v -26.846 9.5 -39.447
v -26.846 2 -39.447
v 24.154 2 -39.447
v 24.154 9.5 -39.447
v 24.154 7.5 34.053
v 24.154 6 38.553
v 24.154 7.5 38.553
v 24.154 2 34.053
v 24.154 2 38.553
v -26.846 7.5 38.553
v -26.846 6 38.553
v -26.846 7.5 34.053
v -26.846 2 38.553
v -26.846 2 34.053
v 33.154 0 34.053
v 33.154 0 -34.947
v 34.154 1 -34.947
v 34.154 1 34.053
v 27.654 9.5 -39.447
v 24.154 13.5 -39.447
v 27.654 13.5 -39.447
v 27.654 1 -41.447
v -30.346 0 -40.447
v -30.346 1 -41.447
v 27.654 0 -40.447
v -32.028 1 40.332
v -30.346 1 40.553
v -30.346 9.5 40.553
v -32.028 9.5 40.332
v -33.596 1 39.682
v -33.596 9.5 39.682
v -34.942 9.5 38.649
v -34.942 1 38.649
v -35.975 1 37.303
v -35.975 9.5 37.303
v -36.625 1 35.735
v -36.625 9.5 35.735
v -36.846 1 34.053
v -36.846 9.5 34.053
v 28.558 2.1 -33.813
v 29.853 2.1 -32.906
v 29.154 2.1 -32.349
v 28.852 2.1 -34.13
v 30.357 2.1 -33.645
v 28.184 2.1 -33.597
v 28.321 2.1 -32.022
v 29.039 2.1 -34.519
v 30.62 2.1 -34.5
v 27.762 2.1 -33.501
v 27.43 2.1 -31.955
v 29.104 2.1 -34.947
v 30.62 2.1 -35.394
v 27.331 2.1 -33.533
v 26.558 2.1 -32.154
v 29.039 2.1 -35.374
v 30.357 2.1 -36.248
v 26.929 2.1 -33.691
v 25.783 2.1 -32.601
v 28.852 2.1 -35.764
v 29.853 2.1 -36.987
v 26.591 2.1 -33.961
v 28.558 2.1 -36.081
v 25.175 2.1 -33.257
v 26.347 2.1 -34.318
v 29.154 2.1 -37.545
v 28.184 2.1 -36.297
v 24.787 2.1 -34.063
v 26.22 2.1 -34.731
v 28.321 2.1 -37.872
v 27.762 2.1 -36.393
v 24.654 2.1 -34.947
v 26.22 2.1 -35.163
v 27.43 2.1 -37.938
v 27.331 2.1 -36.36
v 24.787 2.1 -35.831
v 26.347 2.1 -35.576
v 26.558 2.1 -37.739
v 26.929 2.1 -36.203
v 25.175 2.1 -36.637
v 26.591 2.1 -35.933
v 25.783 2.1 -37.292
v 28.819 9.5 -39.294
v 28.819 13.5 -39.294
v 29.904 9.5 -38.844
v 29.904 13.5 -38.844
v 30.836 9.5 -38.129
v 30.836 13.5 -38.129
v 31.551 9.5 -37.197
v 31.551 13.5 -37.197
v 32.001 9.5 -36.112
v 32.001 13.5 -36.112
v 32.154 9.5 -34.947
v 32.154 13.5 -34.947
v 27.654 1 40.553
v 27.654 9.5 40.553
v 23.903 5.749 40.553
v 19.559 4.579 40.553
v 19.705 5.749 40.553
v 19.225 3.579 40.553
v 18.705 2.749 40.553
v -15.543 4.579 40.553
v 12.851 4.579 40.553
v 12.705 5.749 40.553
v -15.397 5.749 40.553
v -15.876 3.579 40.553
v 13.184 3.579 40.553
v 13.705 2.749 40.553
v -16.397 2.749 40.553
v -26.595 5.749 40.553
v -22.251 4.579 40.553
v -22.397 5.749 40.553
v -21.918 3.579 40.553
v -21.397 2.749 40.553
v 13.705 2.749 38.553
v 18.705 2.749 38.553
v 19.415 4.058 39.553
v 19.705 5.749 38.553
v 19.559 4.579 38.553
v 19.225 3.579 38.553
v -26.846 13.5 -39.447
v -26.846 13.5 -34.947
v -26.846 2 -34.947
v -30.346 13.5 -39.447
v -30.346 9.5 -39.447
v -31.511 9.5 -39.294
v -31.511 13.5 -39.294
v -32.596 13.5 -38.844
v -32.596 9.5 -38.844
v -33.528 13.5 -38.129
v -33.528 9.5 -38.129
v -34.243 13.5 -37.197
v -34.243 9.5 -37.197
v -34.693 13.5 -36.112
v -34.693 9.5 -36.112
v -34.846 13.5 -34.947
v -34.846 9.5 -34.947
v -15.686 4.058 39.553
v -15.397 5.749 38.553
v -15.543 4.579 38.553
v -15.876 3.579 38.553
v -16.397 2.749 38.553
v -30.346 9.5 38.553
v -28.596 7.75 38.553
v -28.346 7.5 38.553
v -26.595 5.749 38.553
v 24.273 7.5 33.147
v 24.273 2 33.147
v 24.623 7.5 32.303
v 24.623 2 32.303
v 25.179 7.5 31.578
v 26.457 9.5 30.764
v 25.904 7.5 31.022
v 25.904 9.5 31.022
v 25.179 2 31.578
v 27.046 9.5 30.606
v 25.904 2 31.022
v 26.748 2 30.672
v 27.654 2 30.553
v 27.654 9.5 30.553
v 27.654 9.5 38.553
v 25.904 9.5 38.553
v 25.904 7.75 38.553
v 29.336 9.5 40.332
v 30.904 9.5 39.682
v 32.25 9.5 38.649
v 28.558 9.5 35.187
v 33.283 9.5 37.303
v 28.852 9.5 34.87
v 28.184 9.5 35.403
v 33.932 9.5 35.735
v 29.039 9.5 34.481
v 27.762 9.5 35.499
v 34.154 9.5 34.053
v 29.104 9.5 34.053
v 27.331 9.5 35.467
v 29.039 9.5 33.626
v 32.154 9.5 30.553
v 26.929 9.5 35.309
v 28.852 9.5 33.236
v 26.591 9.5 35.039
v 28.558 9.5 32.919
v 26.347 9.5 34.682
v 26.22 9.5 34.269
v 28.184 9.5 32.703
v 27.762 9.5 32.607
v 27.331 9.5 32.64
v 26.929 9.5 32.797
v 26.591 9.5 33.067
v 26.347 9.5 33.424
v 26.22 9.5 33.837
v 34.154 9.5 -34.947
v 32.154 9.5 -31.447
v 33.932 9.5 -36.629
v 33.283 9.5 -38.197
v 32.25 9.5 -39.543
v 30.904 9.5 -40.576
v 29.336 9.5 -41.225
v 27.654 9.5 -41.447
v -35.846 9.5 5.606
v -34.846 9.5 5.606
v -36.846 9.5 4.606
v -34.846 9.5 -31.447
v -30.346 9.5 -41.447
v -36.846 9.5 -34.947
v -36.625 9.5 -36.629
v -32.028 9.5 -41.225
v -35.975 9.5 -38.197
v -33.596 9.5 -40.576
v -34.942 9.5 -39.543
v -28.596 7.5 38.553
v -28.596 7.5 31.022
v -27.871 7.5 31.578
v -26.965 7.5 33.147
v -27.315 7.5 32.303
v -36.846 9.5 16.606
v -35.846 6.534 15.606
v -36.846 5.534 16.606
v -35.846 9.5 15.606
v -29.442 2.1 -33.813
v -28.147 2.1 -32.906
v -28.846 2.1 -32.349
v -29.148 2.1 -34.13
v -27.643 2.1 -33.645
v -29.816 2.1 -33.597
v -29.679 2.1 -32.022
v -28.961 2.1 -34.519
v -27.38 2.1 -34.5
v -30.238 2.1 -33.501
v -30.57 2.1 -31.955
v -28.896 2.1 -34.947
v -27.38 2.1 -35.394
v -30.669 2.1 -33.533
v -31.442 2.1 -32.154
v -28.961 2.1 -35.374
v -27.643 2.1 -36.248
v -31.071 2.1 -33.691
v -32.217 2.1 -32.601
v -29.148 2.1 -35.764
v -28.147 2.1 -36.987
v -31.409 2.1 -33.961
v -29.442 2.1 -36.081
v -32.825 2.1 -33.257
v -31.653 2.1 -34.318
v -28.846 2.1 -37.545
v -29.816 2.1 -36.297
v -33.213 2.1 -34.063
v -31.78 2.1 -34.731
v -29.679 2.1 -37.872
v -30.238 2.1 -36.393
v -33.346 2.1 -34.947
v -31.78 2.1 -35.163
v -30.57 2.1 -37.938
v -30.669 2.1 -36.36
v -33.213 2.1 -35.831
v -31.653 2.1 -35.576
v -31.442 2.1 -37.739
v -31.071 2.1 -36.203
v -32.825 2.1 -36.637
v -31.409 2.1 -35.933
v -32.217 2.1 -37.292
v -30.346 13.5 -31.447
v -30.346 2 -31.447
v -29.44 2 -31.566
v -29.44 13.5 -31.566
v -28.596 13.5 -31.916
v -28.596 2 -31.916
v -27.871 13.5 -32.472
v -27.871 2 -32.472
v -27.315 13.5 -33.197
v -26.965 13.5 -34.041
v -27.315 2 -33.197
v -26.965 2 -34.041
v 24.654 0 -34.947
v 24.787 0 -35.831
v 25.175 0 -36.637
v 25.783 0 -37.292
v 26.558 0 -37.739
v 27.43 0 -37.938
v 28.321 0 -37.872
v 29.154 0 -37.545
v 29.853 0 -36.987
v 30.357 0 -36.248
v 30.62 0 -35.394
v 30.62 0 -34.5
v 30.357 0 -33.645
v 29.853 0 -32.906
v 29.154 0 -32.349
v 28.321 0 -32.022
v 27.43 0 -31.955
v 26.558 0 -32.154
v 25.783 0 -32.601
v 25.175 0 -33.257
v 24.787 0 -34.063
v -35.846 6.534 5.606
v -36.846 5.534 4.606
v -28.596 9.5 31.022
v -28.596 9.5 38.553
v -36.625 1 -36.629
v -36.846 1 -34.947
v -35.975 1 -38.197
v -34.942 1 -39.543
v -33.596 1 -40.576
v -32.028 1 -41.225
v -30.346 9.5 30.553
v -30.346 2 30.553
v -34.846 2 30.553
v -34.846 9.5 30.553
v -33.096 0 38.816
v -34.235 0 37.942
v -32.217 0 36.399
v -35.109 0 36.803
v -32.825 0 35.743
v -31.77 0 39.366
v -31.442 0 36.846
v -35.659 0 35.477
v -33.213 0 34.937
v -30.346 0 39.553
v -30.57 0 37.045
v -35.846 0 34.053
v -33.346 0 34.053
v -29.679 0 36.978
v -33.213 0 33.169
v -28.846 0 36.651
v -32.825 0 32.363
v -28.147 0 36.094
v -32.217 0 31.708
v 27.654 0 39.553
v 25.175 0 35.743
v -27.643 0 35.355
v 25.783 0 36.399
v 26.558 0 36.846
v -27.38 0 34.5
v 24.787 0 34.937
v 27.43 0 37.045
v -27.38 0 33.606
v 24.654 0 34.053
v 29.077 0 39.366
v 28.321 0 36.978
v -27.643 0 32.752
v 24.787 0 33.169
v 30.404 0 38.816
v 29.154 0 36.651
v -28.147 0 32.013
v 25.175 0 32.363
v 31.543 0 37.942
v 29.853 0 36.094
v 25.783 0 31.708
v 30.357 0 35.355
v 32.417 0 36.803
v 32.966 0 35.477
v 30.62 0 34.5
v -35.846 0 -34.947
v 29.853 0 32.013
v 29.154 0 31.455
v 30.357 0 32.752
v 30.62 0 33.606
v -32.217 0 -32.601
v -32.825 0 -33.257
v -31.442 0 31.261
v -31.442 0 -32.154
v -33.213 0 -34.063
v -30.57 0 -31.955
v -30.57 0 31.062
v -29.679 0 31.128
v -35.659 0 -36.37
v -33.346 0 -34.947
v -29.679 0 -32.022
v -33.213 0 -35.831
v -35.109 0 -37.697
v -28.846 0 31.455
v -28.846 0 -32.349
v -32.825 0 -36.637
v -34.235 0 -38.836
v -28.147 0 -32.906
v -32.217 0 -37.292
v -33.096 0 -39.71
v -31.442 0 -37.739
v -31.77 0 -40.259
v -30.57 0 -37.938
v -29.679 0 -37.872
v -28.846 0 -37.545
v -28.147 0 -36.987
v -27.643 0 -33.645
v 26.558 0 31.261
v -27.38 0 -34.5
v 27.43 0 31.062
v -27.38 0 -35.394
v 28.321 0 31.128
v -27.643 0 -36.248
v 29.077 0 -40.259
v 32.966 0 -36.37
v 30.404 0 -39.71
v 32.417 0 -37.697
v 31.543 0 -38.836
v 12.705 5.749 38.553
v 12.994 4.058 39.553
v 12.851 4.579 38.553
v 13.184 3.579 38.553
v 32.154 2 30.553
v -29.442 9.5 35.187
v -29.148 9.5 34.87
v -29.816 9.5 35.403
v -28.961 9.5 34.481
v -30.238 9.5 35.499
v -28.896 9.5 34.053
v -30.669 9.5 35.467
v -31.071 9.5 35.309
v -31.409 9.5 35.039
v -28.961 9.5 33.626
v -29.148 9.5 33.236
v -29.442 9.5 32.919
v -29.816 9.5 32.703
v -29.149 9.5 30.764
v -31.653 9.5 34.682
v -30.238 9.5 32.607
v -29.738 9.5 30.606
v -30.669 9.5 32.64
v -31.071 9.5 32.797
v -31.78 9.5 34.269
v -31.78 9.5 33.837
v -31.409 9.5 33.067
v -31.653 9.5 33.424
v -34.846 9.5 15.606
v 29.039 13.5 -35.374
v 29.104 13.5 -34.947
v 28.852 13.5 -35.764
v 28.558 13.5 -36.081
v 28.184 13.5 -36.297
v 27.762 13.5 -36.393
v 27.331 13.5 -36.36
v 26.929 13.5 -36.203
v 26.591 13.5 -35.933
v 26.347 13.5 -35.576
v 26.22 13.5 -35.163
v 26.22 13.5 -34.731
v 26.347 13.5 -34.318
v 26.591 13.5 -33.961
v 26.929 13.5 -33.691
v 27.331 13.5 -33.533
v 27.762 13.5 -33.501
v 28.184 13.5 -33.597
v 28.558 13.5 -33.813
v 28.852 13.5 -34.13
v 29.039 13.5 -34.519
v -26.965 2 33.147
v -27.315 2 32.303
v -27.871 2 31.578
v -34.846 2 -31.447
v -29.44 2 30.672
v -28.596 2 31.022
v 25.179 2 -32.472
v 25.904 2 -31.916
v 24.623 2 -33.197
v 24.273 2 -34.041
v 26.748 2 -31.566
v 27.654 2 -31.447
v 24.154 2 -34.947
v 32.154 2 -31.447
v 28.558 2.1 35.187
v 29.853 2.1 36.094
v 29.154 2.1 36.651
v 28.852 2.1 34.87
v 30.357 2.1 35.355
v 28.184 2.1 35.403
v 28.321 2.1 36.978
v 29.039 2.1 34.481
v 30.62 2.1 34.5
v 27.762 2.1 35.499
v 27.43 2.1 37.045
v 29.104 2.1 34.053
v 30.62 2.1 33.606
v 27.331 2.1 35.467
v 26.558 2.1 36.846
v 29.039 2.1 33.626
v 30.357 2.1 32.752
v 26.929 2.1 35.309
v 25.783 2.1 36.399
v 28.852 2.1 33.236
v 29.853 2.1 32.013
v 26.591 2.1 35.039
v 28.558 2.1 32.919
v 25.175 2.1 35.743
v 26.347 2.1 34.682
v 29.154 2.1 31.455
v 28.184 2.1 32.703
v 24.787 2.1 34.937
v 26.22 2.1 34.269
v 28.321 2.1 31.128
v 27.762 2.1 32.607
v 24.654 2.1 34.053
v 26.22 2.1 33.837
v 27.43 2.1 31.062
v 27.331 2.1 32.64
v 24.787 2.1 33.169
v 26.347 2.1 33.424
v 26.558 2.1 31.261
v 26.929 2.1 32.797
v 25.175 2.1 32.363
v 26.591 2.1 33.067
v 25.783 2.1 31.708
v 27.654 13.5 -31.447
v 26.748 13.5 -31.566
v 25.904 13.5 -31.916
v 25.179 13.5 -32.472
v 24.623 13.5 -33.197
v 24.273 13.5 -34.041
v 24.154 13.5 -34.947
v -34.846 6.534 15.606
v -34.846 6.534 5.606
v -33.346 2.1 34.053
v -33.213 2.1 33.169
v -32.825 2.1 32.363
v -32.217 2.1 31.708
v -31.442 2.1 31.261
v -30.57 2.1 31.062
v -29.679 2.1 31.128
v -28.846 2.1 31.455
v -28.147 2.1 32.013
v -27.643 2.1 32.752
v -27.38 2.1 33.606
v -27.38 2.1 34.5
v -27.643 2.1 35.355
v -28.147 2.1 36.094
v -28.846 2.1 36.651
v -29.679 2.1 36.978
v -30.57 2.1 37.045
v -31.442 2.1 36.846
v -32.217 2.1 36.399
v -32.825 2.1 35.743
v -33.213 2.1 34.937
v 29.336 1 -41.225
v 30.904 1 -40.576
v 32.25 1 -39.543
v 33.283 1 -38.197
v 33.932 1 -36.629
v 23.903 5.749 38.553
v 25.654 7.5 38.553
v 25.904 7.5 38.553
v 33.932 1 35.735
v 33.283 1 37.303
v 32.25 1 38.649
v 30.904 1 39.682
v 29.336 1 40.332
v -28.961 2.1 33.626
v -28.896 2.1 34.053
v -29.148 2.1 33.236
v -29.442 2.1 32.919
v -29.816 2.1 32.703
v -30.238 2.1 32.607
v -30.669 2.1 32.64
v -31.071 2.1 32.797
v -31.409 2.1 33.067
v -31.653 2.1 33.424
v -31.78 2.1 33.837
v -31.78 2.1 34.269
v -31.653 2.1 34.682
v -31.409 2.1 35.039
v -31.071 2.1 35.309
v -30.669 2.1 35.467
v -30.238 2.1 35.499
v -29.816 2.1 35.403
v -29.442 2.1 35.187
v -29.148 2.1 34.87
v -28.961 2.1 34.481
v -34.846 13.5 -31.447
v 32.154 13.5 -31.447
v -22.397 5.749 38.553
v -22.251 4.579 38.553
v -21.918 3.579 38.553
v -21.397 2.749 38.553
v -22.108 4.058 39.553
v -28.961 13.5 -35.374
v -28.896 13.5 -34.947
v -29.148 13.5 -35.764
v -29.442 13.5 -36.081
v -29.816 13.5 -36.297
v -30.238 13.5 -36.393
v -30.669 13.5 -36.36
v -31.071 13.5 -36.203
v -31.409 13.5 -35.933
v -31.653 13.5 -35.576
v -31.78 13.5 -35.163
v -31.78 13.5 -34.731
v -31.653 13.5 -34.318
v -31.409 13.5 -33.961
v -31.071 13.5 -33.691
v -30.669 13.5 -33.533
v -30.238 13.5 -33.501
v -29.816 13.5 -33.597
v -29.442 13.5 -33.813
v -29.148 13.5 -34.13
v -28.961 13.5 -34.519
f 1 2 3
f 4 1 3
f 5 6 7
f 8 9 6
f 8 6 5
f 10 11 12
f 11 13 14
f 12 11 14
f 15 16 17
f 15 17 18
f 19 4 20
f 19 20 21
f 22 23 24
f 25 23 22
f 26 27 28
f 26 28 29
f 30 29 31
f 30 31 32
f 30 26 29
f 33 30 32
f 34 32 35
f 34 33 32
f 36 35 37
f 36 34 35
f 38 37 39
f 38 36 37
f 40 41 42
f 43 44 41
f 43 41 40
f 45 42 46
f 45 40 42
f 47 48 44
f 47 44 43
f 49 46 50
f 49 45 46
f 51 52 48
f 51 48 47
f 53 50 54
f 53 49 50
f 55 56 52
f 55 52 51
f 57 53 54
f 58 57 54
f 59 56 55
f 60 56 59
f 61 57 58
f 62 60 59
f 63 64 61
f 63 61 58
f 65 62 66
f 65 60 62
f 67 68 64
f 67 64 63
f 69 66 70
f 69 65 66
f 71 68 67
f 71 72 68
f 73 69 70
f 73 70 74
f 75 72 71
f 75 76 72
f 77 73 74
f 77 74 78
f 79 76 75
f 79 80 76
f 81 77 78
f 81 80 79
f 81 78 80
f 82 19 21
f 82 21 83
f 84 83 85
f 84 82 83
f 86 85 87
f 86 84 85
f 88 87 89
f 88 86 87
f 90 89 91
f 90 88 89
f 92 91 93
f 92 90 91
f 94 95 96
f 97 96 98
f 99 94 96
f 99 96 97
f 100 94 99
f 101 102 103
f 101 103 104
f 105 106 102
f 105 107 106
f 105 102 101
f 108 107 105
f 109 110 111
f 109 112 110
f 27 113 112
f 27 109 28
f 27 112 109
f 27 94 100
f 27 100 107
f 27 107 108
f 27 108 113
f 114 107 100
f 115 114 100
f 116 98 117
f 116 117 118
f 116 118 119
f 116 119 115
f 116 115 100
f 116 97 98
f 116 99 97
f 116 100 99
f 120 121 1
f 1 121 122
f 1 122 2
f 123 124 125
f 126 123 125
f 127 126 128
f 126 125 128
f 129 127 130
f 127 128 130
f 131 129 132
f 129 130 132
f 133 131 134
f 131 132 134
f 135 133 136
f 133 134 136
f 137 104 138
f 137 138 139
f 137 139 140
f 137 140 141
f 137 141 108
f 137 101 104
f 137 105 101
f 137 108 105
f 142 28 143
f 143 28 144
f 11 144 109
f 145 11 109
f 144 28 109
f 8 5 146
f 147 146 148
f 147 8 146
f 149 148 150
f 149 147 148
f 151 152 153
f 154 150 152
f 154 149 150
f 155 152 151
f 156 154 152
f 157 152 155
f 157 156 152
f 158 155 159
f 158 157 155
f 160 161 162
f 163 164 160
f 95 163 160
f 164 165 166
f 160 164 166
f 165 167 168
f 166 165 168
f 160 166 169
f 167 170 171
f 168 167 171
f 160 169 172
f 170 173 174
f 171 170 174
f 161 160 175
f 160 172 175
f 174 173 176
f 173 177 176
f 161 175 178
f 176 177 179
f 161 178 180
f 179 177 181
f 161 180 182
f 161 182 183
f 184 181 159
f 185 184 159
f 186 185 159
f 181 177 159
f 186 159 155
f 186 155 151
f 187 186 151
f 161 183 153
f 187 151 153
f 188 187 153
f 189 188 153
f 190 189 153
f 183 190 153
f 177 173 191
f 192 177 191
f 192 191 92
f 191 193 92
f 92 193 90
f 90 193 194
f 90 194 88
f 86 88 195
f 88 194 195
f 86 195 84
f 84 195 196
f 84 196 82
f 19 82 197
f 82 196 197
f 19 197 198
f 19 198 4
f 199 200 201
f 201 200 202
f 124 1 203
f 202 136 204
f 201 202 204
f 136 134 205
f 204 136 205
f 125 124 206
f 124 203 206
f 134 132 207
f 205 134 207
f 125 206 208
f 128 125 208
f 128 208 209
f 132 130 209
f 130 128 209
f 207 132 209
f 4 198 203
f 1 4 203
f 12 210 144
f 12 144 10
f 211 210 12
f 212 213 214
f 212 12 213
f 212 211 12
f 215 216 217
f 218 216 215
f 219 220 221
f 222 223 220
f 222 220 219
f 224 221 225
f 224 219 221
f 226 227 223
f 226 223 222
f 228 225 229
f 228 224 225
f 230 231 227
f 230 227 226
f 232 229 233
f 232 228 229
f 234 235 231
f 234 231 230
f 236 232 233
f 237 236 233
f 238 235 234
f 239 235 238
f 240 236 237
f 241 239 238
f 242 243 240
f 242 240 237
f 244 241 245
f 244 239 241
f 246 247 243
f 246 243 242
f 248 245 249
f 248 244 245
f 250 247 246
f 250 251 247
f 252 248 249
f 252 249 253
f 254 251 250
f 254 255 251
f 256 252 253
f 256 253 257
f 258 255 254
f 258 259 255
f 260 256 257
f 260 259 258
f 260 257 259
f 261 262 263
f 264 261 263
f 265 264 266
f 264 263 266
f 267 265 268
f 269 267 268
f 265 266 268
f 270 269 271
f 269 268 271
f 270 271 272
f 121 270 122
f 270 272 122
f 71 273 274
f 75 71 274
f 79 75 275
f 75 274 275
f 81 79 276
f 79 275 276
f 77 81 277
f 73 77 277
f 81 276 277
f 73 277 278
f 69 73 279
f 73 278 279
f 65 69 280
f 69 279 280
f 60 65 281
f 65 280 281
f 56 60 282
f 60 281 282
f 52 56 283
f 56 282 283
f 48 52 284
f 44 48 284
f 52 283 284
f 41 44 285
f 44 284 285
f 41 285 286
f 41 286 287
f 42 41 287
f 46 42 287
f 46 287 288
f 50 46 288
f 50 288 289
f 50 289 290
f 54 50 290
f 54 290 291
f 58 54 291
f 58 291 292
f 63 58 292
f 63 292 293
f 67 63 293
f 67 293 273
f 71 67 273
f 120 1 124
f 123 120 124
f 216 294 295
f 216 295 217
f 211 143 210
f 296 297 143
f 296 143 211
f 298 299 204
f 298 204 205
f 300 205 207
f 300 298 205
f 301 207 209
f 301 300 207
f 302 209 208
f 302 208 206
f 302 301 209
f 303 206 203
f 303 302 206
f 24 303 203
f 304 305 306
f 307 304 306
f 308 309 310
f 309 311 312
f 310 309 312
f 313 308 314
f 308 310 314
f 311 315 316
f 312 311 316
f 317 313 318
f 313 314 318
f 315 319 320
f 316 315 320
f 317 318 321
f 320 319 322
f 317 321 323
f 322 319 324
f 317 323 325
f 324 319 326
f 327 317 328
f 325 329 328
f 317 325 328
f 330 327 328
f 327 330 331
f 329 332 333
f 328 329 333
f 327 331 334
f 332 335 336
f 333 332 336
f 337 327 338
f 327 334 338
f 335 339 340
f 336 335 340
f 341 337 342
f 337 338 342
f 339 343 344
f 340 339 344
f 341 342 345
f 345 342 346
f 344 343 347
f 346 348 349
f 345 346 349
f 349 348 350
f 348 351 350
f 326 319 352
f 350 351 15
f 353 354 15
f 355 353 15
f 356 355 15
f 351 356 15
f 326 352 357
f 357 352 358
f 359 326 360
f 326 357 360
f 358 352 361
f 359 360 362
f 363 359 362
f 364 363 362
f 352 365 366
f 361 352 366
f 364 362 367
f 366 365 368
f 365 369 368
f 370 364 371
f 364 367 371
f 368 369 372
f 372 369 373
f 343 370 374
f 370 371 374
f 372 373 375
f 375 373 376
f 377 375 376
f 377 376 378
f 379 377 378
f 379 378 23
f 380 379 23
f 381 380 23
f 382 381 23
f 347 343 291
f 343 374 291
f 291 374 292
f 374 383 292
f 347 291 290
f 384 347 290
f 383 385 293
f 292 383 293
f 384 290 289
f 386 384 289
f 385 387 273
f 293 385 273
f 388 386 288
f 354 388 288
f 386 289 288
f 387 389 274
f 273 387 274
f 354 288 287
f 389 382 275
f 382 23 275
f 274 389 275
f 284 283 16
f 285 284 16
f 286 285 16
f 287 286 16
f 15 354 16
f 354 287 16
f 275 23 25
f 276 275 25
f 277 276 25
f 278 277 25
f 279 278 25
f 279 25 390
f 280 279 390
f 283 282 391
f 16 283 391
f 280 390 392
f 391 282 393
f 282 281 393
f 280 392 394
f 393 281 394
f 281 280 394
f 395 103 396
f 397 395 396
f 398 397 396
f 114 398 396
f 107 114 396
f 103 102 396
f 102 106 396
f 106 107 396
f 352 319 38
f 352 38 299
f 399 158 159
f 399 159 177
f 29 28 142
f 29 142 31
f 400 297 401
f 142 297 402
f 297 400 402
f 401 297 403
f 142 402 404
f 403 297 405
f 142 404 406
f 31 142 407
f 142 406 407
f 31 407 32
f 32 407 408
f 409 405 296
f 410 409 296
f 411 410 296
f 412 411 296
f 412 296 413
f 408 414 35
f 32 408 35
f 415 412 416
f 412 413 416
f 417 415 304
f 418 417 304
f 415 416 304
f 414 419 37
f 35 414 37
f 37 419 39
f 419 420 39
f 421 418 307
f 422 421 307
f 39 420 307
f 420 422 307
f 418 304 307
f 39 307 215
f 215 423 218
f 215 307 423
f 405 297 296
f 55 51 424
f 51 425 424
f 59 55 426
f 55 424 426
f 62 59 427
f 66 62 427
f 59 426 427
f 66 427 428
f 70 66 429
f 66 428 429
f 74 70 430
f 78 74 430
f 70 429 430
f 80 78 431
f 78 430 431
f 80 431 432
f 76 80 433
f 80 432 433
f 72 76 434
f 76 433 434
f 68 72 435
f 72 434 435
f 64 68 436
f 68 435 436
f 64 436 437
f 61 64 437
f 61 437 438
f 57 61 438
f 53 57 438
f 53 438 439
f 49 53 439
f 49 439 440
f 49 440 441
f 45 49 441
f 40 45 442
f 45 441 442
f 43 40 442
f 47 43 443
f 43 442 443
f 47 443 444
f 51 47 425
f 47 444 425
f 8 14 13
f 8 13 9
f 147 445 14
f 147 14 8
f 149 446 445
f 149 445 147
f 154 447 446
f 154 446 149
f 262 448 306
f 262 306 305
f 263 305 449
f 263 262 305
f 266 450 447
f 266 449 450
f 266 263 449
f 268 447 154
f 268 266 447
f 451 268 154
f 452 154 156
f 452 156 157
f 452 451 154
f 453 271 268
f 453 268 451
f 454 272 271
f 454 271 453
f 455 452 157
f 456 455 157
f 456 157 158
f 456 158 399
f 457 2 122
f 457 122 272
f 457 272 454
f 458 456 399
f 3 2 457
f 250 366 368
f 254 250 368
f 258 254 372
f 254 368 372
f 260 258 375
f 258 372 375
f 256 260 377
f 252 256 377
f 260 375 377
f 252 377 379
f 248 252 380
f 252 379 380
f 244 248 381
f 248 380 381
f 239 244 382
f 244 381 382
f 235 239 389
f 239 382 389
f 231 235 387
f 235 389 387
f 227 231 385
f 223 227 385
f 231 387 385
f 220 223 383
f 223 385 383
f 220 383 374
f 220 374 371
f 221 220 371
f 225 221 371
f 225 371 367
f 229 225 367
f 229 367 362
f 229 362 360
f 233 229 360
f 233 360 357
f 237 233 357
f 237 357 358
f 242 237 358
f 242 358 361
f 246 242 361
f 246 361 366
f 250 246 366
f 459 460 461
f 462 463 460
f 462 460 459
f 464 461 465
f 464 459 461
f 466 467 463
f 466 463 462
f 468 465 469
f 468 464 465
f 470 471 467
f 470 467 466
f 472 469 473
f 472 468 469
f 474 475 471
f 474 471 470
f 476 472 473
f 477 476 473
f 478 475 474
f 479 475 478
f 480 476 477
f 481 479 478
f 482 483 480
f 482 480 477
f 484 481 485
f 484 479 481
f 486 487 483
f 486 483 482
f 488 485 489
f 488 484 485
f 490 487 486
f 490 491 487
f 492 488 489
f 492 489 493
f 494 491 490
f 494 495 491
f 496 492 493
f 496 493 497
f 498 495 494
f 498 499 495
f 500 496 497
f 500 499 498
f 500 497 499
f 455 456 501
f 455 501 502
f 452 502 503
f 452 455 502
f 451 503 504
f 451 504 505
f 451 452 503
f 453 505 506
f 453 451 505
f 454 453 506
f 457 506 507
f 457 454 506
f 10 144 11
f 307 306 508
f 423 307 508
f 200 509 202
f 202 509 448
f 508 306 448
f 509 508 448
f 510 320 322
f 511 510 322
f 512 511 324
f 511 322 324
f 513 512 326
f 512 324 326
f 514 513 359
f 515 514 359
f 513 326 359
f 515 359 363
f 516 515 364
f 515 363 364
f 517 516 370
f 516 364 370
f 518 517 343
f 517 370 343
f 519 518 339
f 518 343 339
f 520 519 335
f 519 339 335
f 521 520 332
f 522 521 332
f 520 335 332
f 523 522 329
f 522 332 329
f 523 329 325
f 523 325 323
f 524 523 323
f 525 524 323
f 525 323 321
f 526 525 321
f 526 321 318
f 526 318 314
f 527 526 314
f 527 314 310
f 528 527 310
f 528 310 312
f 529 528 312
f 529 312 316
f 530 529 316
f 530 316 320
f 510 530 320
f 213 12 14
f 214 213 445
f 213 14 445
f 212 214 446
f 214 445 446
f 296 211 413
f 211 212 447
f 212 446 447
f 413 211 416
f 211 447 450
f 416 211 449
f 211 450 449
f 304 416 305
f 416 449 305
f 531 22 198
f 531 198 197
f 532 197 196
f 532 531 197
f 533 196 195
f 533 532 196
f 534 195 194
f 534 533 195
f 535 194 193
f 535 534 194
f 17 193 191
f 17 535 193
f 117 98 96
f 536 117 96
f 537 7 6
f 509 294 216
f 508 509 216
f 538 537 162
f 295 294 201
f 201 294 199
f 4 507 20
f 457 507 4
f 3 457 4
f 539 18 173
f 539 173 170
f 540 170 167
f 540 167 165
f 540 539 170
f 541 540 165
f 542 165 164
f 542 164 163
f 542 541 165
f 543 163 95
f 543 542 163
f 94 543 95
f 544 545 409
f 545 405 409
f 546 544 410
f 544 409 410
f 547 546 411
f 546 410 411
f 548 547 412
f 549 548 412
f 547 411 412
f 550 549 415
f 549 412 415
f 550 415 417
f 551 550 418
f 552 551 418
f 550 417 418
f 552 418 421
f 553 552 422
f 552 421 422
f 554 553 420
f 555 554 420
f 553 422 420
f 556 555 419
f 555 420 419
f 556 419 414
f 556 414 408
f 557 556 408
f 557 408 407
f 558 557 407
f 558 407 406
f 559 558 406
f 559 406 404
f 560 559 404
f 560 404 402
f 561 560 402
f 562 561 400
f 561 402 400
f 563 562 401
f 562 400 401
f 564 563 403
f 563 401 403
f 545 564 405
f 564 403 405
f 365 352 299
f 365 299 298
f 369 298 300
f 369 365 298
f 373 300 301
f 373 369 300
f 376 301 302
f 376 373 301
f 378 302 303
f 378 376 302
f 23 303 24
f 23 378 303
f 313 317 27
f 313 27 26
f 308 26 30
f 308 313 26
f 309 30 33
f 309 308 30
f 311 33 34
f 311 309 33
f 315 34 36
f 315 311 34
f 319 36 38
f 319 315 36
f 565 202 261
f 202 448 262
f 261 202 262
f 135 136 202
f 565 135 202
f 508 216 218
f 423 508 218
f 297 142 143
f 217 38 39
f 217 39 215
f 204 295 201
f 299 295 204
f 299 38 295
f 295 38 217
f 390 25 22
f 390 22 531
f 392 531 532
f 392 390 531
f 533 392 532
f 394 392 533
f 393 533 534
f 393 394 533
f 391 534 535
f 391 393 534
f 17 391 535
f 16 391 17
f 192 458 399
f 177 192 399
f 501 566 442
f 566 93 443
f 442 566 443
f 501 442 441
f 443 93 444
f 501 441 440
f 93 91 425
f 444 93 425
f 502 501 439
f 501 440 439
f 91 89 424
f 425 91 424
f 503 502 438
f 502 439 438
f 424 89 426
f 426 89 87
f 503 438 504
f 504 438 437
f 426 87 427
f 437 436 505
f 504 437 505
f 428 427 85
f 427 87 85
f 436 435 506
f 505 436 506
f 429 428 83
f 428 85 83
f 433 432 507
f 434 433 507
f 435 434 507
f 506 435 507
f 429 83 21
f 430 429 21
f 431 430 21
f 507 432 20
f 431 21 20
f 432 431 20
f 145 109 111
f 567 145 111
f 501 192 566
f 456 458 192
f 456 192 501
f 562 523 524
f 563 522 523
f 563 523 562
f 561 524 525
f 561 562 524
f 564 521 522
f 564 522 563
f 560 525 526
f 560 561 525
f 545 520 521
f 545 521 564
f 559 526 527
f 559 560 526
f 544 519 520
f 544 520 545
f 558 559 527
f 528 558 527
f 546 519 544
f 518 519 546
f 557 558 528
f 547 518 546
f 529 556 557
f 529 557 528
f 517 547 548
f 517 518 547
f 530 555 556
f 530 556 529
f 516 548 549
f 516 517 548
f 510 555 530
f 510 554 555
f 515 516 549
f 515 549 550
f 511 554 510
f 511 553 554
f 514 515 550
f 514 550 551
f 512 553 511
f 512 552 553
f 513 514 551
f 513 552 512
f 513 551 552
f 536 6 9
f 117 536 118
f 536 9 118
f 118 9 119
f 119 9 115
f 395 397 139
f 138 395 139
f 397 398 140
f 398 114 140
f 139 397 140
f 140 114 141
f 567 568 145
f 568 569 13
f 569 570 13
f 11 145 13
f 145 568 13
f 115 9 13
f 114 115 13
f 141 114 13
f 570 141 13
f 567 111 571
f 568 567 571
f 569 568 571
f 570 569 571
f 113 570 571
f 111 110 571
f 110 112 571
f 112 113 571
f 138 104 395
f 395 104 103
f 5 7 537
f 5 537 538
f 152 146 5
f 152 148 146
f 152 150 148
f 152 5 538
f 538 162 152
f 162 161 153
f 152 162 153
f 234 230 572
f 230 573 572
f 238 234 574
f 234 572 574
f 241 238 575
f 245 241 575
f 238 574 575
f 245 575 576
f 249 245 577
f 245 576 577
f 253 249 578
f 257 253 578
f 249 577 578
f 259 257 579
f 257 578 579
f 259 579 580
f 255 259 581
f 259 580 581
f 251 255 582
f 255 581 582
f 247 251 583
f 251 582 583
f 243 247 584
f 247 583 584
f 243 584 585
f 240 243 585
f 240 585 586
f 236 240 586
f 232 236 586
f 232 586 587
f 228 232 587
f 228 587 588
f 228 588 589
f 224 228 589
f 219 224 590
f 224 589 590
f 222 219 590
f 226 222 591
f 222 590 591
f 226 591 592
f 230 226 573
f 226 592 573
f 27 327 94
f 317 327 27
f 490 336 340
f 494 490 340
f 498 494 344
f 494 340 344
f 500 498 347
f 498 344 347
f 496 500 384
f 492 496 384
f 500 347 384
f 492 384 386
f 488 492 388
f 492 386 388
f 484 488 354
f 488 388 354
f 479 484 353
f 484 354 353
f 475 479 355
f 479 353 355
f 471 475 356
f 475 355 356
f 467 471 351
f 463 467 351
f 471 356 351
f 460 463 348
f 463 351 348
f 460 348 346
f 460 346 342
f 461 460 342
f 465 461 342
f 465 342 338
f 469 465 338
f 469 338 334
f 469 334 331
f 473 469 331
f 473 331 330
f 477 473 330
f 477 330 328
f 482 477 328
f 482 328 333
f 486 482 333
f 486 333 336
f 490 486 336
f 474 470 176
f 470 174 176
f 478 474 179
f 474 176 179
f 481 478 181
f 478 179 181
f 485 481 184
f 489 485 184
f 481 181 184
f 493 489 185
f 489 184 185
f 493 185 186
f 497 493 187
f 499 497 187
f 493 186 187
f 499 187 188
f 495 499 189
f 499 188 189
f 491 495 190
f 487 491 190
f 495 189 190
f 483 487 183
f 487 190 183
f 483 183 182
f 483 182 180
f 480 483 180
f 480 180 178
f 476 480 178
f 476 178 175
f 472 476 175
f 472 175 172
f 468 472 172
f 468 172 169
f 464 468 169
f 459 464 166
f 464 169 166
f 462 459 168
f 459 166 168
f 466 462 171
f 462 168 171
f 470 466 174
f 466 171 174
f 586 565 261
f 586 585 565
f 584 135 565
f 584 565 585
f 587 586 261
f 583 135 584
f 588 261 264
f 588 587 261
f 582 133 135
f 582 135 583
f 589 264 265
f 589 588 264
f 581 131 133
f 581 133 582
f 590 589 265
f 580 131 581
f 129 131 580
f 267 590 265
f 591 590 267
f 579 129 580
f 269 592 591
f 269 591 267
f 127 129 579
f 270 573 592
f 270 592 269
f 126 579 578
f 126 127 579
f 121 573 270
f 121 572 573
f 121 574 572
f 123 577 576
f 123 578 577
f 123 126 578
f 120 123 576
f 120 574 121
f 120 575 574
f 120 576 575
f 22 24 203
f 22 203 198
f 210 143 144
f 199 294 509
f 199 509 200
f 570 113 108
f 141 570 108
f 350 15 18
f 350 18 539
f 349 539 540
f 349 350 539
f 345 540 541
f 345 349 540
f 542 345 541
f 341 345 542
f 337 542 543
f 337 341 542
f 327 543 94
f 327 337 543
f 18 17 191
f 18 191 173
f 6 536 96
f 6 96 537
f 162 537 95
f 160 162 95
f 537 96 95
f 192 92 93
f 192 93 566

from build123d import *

# Parameters (mm, degrees)
BOSS_EXTRUDE1_DEPTH                                = 9.5
BOSS_EXTRUDE2_DEPTH                                = 2
BOSS_EXTRUDE4_DEPTH                                = 11.5
BOSS_EXTRUDE6_DEPTH                                = 7.5
CUT_EXTRUDE1_DEPTH                                 = 2
CUT_EXTRUDE2_REACH                                 = 85.313
SKETCH9_W                                          = 10
SKETCH9_H                                          = 3
CHAMFER1_SIZE                                      = 1
CHAMFER2_SIZE                                      = 1
CBORE_FOR_M2_5_PAN_HEAD_MACHINE_SCREW1_D           = 2.9
CBORE_FOR_M2_5_PAN_HEAD_MACHINE_SCREW1_CBORE_D     = 6
CBORE_FOR_M2_5_PAN_HEAD_MACHINE_SCREW1_CBORE_DEPTH = 2.1
CBORE_FOR_M2_5_PAN_HEAD_MACHINE_SCREW2_D           = 2.9
CBORE_FOR_M2_5_PAN_HEAD_MACHINE_SCREW2_CBORE_D     = 6
CBORE_FOR_M2_5_PAN_HEAD_MACHINE_SCREW2_CBORE_DEPTH = 2.1
CBORE_FOR_M2_5_PAN_HEAD_MACHINE_SCREW3_D           = 2.9
CBORE_FOR_M2_5_PAN_HEAD_MACHINE_SCREW3_CBORE_D     = 6
CBORE_FOR_M2_5_PAN_HEAD_MACHINE_SCREW3_CBORE_DEPTH = 2.1
CBORE_FOR_M2_5_PAN_HEAD_MACHINE_SCREW4_D           = 2.9
CBORE_FOR_M2_5_PAN_HEAD_MACHINE_SCREW4_CBORE_D     = 6
CBORE_FOR_M2_5_PAN_HEAD_MACHINE_SCREW4_CBORE_DEPTH = 2.1
SKETCH18_W                                         = 54.5
SKETCH18_H                                         = 7.531088913
CUT_EXTRUDE3_DEPTH                                 = 2


with BuildPart() as part:
    # Sketch2 → Boss-Extrude1 (new body)
    with BuildSketch(Plane(origin=(0, 0, 0), x_dir=(1, 0, 0), z_dir=(0, 1, 0))):
        with BuildLine():
            Line((-30.346153846, 41.446848386), (27.653846154, 41.446848386))
            ThreePointArc((27.653846154, 41.446848386), (32.250040232, 39.543042463), (34.153846154, 34.946848386))
            Line((34.153846154, 34.946848386), (34.153846154, -34.053151614))
            ThreePointArc((34.153846154, -34.053151614), (32.250040232, -38.649345692), (27.653846154, -40.553151614))
            Line((27.653846154, -40.553151614), (-30.346153846, -40.553151614))
            ThreePointArc((-30.346153846, -40.553151614), (-34.942347924, -38.649345692), (-36.846153846, -34.053151614))
            Line((-36.846153846, -34.053151614), (-36.846153846, 34.946848386))
            ThreePointArc((-36.846153846, 34.946848386), (-34.942347924, 39.543042463), (-30.346153846, 41.446848386))
        make_face()
        with BuildLine():
            Line((-30.346153846, 39.446848386), (27.653846154, 39.446848386))
            ThreePointArc((27.653846154, 39.446848386), (30.835826669, 38.128828901), (32.153846154, 34.946848386))
            Line((32.153846154, 34.946848386), (32.153846154, -34.053151614))
            ThreePointArc((32.153846154, -34.053151614), (30.835826669, -37.23513213), (27.653846154, -38.553151614))
            Line((27.653846154, -38.553151614), (-30.346153846, -38.553151614))
            ThreePointArc((-30.346153846, -38.553151614), (-33.528134361, -37.23513213), (-34.846153846, -34.053151614))
            Line((-34.846153846, -34.053151614), (-34.846153846, 34.946848386))
            ThreePointArc((-34.846153846, 34.946848386), (-33.528134361, 38.128828901), (-30.346153846, 39.446848386))
        make_face(mode=Mode.SUBTRACT)
    extrude(amount=BOSS_EXTRUDE1_DEPTH)

    # Sketch3 → Boss-Extrude2 (add)
    with BuildSketch(Plane(origin=(0, 0, 0), x_dir=(1, 0, 0), z_dir=(0, 1, 0))):
        with BuildLine():
            Line((-30.346153846, -38.553151614), (27.653846154, -38.553151614))
            ThreePointArc((27.653846154, -38.553151614), (30.835826669, -37.23513213), (32.153846154, -34.053151614))
            Line((32.153846154, -34.053151614), (32.153846154, 34.946848386))
            ThreePointArc((32.153846154, 34.946848386), (30.835826669, 38.128828901), (27.653846154, 39.446848386))
            Line((27.653846154, 39.446848386), (-30.346153846, 39.446848386))
            ThreePointArc((-30.346153846, 39.446848386), (-33.528134361, 38.128828901), (-34.846153846, 34.946848386))
            Line((-34.846153846, 34.946848386), (-34.846153846, -34.053151614))
            ThreePointArc((-34.846153846, -34.053151614), (-33.528134361, -37.23513213), (-30.346153846, -38.553151614))
        make_face()
    extrude(amount=BOSS_EXTRUDE2_DEPTH)

    # Sketch6 → Boss-Extrude4 (add)
    with BuildSketch(Plane(origin=(0, 2, 0), x_dir=(1, 0, 0), z_dir=(0, 1, 0))):
        with BuildLine():
            Line((-26.846153846, 34.946848386), (-26.846153846, 39.446848386))
            Line((-26.846153846, 39.446848386), (-30.346153846, 39.446848386))
            ThreePointArc((-30.346153846, 39.446848386), (-33.528134361, 38.128828901), (-34.846153846, 34.946848386))
            Line((-34.846153846, 34.946848386), (-34.846153846, 31.446848386))
            Line((-34.846153846, 31.446848386), (-30.346153846, 31.446848386))
            ThreePointArc((-30.346153846, 31.446848386), (-27.871280112, 32.471974652), (-26.846153846, 34.946848386))
        make_face()
        with BuildLine():
            Line((24.153846154, 34.946848386), (24.153846154, 39.446848386))
            Line((24.153846154, 39.446848386), (27.653846154, 39.446848386))
            ThreePointArc((27.653846154, 39.446848386), (30.835826669, 38.128828901), (32.153846154, 34.946848386))
            Line((32.153846154, 34.946848386), (32.153846154, 31.446848386))
            Line((32.153846154, 31.446848386), (27.653846154, 31.446848386))
            ThreePointArc((27.653846154, 31.446848386), (25.17897242, 32.471974652), (24.153846154, 34.946848386))
        make_face()
    extrude(amount=BOSS_EXTRUDE4_DEPTH)

    # Sketch8 → Boss-Extrude6 (add)
    with BuildSketch(Plane(origin=(0, 2, 0), x_dir=(1, 0, 0), z_dir=(0, 1, 0))):
        with BuildLine():
            Line((32.153846154, -30.553151614), (32.153846154, -34.053151614))
            ThreePointArc((32.153846154, -34.053151614), (30.835826669, -37.23513213), (27.653846154, -38.553151614))
            Line((27.653846154, -38.553151614), (24.153846154, -38.553151614))
            Line((24.153846154, -38.553151614), (24.153846154, -34.053151614))
            ThreePointArc((24.153846154, -34.053151614), (25.17897242, -31.57827788), (27.653846154, -30.553151614))
            Line((27.653846154, -30.553151614), (32.153846154, -30.553151614))
        make_face()
        with BuildLine():
            Line((-34.846153846, -30.553151614), (-34.846153846, -34.053151614))
            ThreePointArc((-34.846153846, -34.053151614), (-33.528134361, -37.23513213), (-30.346153846, -38.553151614))
            Line((-30.346153846, -38.553151614), (-26.846153846, -38.553151614))
            Line((-26.846153846, -38.553151614), (-26.846153846, -34.053151614))
            ThreePointArc((-26.846153846, -34.053151614), (-27.871280112, -31.57827788), (-30.346153846, -30.553151614))
            Line((-30.346153846, -30.553151614), (-34.846153846, -30.553151614))
        make_face()
    extrude(amount=BOSS_EXTRUDE6_DEPTH)

    # Sketch7 → Cut-Extrude1 (cut)
    with BuildSketch(Plane.XY.offset(40.553151614)):
        with BuildLine():
            Line((27.653846154, 9.5), (-30.346153846, 9.5))
            Line((-30.346153846, 9.5), (-26.595001855, 5.748848009))
            Line((-26.595001855, 5.748848009), (-22.39693017, 5.748848009))
            add(Edge.make_bspline(
                [(-22.39693017, 5.748848009), (-22.318478092, 3.867695791), (-21.39693017, 2.748848009)],
                knots=[0, 0, 0, 0.447396811, 0.447396811, 0.447396811], degree=2))
            Line((-21.39693017, 2.748848009), (-16.39693017, 2.748848009))
            add(Edge.make_bspline(
                [(-15.39693017, 5.748848009), (-15.475382247, 3.867695791), (-16.39693017, 2.748848009)],
                knots=[0, 0, 0, 0.447396811, 0.447396811, 0.447396811], degree=2))
            Line((-15.39693017, 5.748848009), (12.704622477, 5.748848009))
            add(Edge.make_bspline(
                [(12.704622477, 5.748848009), (12.783074555, 3.867695791), (13.704622477, 2.748848009)],
                knots=[0, 0, 0, 0.447396811, 0.447396811, 0.447396811], degree=2))
            Line((13.704622477, 2.748848009), (18.704622477, 2.748848009))
            add(Edge.make_bspline(
                [(19.704622477, 5.748848009), (19.6261704, 3.867695791), (18.704622477, 2.748848009)],
                knots=[0, 0, 0, 0.447396811, 0.447396811, 0.447396811], degree=2))
            Line((19.704622477, 5.748848009), (23.902694163, 5.748848009))
            Line((23.902694163, 5.748848009), (27.653846154, 9.5))
        make_face()
    extrude(amount=-CUT_EXTRUDE1_DEPTH, mode=Mode.SUBTRACT)

    # Sketch9 → Cut-Extrude2 (cut, up to next)
    with BuildSketch(Plane.ZY.offset(36.846153846), mode=Mode.PRIVATE) as cut_extrude2_sk1:
        with Locations((10.60615222, 8.033769059)):
            Rectangle(SKETCH9_W, SKETCH9_H)
    cut_extrude2_tool1 = extrude(cut_extrude2_sk1.sketch, amount=-CUT_EXTRUDE2_REACH, mode=Mode.PRIVATE) & part.part
    add(cut_extrude2_tool1.solids().sort_by_distance((-36.846154, 8.033769, 10.606152))[0], mode=Mode.SUBTRACT)

    # Chamfer1
    chamfer1_edges = [part.edges().sort_by_distance(p)[0] for p in [
        (-36.846153846, 8.01688453, 15.60615222),
        (-36.846153846, 8.01688453, 5.60615222),
        (-36.846153846, 6.533769059, 10.60615222),
    ]]
    chamfer(chamfer1_edges, length=CHAMFER1_SIZE)

    # Chamfer2
    chamfer2_edges = [part.edges().sort_by_distance(p)[0] for p in [
        (-36.846153846, 0, -0.446848386),
        (-34.942347924, 0, -39.543042463),
        (-1.346153846, 0, -41.446848386),
        (32.250040232, 0, -39.543042463),
        (34.153846154, 0, -0.446848386),
        (32.250040232, 0, 38.649345692),
        (-1.346153846, 0, 40.553151614),
        (-34.942347924, 0, 38.649345692),
    ]]
    chamfer(chamfer2_edges, length=CHAMFER2_SIZE)

    # CBORE for M2.5 Pan Head Machine Screw1 (through all)
    with Locations(Plane(origin=(0, 0, 0), x_dir=(-1, 0, 0), z_dir=(0, -1, 0))):
        with Locations((-27.653846154, 34.946848386)):
            CounterBoreHole(CBORE_FOR_M2_5_PAN_HEAD_MACHINE_SCREW1_D / 2, CBORE_FOR_M2_5_PAN_HEAD_MACHINE_SCREW1_CBORE_D / 2, CBORE_FOR_M2_5_PAN_HEAD_MACHINE_SCREW1_CBORE_DEPTH)

    # CBORE for M2.5 Pan Head Machine Screw2 (through all)
    with Locations(Plane(origin=(0, 0, 0), x_dir=(-1, 0, 0), z_dir=(0, -1, 0))):
        with Locations((30.346153846, 34.946848386)):
            CounterBoreHole(CBORE_FOR_M2_5_PAN_HEAD_MACHINE_SCREW2_D / 2, CBORE_FOR_M2_5_PAN_HEAD_MACHINE_SCREW2_CBORE_D / 2, CBORE_FOR_M2_5_PAN_HEAD_MACHINE_SCREW2_CBORE_DEPTH)

    # CBORE for M2.5 Pan Head Machine Screw3 (through all)
    with Locations(Plane(origin=(0, 0, 0), x_dir=(-1, 0, 0), z_dir=(0, -1, 0))):
        with Locations((-27.653846154, -34.053151614)):
            CounterBoreHole(CBORE_FOR_M2_5_PAN_HEAD_MACHINE_SCREW3_D / 2, CBORE_FOR_M2_5_PAN_HEAD_MACHINE_SCREW3_CBORE_D / 2, CBORE_FOR_M2_5_PAN_HEAD_MACHINE_SCREW3_CBORE_DEPTH)

    # CBORE for M2.5 Pan Head Machine Screw4 (through all)
    with Locations(Plane(origin=(0, 0, 0), x_dir=(-1, 0, 0), z_dir=(0, -1, 0))):
        with Locations((30.346153846, -34.053151614)):
            CounterBoreHole(CBORE_FOR_M2_5_PAN_HEAD_MACHINE_SCREW4_D / 2, CBORE_FOR_M2_5_PAN_HEAD_MACHINE_SCREW4_CBORE_D / 2, CBORE_FOR_M2_5_PAN_HEAD_MACHINE_SCREW4_CBORE_DEPTH)

    # Sketch18 → Cut-Extrude3 (cut)
    with BuildSketch(Plane(origin=(0, 9.5, 0), x_dir=(1, 0, 0), z_dir=(0, 1, 0))):
        with Locations((-1.346153846, -34.787607158)):
            Rectangle(SKETCH18_W, SKETCH18_H)
    extrude(amount=-CUT_EXTRUDE3_DEPTH, mode=Mode.SUBTRACT)


solid = part.part
